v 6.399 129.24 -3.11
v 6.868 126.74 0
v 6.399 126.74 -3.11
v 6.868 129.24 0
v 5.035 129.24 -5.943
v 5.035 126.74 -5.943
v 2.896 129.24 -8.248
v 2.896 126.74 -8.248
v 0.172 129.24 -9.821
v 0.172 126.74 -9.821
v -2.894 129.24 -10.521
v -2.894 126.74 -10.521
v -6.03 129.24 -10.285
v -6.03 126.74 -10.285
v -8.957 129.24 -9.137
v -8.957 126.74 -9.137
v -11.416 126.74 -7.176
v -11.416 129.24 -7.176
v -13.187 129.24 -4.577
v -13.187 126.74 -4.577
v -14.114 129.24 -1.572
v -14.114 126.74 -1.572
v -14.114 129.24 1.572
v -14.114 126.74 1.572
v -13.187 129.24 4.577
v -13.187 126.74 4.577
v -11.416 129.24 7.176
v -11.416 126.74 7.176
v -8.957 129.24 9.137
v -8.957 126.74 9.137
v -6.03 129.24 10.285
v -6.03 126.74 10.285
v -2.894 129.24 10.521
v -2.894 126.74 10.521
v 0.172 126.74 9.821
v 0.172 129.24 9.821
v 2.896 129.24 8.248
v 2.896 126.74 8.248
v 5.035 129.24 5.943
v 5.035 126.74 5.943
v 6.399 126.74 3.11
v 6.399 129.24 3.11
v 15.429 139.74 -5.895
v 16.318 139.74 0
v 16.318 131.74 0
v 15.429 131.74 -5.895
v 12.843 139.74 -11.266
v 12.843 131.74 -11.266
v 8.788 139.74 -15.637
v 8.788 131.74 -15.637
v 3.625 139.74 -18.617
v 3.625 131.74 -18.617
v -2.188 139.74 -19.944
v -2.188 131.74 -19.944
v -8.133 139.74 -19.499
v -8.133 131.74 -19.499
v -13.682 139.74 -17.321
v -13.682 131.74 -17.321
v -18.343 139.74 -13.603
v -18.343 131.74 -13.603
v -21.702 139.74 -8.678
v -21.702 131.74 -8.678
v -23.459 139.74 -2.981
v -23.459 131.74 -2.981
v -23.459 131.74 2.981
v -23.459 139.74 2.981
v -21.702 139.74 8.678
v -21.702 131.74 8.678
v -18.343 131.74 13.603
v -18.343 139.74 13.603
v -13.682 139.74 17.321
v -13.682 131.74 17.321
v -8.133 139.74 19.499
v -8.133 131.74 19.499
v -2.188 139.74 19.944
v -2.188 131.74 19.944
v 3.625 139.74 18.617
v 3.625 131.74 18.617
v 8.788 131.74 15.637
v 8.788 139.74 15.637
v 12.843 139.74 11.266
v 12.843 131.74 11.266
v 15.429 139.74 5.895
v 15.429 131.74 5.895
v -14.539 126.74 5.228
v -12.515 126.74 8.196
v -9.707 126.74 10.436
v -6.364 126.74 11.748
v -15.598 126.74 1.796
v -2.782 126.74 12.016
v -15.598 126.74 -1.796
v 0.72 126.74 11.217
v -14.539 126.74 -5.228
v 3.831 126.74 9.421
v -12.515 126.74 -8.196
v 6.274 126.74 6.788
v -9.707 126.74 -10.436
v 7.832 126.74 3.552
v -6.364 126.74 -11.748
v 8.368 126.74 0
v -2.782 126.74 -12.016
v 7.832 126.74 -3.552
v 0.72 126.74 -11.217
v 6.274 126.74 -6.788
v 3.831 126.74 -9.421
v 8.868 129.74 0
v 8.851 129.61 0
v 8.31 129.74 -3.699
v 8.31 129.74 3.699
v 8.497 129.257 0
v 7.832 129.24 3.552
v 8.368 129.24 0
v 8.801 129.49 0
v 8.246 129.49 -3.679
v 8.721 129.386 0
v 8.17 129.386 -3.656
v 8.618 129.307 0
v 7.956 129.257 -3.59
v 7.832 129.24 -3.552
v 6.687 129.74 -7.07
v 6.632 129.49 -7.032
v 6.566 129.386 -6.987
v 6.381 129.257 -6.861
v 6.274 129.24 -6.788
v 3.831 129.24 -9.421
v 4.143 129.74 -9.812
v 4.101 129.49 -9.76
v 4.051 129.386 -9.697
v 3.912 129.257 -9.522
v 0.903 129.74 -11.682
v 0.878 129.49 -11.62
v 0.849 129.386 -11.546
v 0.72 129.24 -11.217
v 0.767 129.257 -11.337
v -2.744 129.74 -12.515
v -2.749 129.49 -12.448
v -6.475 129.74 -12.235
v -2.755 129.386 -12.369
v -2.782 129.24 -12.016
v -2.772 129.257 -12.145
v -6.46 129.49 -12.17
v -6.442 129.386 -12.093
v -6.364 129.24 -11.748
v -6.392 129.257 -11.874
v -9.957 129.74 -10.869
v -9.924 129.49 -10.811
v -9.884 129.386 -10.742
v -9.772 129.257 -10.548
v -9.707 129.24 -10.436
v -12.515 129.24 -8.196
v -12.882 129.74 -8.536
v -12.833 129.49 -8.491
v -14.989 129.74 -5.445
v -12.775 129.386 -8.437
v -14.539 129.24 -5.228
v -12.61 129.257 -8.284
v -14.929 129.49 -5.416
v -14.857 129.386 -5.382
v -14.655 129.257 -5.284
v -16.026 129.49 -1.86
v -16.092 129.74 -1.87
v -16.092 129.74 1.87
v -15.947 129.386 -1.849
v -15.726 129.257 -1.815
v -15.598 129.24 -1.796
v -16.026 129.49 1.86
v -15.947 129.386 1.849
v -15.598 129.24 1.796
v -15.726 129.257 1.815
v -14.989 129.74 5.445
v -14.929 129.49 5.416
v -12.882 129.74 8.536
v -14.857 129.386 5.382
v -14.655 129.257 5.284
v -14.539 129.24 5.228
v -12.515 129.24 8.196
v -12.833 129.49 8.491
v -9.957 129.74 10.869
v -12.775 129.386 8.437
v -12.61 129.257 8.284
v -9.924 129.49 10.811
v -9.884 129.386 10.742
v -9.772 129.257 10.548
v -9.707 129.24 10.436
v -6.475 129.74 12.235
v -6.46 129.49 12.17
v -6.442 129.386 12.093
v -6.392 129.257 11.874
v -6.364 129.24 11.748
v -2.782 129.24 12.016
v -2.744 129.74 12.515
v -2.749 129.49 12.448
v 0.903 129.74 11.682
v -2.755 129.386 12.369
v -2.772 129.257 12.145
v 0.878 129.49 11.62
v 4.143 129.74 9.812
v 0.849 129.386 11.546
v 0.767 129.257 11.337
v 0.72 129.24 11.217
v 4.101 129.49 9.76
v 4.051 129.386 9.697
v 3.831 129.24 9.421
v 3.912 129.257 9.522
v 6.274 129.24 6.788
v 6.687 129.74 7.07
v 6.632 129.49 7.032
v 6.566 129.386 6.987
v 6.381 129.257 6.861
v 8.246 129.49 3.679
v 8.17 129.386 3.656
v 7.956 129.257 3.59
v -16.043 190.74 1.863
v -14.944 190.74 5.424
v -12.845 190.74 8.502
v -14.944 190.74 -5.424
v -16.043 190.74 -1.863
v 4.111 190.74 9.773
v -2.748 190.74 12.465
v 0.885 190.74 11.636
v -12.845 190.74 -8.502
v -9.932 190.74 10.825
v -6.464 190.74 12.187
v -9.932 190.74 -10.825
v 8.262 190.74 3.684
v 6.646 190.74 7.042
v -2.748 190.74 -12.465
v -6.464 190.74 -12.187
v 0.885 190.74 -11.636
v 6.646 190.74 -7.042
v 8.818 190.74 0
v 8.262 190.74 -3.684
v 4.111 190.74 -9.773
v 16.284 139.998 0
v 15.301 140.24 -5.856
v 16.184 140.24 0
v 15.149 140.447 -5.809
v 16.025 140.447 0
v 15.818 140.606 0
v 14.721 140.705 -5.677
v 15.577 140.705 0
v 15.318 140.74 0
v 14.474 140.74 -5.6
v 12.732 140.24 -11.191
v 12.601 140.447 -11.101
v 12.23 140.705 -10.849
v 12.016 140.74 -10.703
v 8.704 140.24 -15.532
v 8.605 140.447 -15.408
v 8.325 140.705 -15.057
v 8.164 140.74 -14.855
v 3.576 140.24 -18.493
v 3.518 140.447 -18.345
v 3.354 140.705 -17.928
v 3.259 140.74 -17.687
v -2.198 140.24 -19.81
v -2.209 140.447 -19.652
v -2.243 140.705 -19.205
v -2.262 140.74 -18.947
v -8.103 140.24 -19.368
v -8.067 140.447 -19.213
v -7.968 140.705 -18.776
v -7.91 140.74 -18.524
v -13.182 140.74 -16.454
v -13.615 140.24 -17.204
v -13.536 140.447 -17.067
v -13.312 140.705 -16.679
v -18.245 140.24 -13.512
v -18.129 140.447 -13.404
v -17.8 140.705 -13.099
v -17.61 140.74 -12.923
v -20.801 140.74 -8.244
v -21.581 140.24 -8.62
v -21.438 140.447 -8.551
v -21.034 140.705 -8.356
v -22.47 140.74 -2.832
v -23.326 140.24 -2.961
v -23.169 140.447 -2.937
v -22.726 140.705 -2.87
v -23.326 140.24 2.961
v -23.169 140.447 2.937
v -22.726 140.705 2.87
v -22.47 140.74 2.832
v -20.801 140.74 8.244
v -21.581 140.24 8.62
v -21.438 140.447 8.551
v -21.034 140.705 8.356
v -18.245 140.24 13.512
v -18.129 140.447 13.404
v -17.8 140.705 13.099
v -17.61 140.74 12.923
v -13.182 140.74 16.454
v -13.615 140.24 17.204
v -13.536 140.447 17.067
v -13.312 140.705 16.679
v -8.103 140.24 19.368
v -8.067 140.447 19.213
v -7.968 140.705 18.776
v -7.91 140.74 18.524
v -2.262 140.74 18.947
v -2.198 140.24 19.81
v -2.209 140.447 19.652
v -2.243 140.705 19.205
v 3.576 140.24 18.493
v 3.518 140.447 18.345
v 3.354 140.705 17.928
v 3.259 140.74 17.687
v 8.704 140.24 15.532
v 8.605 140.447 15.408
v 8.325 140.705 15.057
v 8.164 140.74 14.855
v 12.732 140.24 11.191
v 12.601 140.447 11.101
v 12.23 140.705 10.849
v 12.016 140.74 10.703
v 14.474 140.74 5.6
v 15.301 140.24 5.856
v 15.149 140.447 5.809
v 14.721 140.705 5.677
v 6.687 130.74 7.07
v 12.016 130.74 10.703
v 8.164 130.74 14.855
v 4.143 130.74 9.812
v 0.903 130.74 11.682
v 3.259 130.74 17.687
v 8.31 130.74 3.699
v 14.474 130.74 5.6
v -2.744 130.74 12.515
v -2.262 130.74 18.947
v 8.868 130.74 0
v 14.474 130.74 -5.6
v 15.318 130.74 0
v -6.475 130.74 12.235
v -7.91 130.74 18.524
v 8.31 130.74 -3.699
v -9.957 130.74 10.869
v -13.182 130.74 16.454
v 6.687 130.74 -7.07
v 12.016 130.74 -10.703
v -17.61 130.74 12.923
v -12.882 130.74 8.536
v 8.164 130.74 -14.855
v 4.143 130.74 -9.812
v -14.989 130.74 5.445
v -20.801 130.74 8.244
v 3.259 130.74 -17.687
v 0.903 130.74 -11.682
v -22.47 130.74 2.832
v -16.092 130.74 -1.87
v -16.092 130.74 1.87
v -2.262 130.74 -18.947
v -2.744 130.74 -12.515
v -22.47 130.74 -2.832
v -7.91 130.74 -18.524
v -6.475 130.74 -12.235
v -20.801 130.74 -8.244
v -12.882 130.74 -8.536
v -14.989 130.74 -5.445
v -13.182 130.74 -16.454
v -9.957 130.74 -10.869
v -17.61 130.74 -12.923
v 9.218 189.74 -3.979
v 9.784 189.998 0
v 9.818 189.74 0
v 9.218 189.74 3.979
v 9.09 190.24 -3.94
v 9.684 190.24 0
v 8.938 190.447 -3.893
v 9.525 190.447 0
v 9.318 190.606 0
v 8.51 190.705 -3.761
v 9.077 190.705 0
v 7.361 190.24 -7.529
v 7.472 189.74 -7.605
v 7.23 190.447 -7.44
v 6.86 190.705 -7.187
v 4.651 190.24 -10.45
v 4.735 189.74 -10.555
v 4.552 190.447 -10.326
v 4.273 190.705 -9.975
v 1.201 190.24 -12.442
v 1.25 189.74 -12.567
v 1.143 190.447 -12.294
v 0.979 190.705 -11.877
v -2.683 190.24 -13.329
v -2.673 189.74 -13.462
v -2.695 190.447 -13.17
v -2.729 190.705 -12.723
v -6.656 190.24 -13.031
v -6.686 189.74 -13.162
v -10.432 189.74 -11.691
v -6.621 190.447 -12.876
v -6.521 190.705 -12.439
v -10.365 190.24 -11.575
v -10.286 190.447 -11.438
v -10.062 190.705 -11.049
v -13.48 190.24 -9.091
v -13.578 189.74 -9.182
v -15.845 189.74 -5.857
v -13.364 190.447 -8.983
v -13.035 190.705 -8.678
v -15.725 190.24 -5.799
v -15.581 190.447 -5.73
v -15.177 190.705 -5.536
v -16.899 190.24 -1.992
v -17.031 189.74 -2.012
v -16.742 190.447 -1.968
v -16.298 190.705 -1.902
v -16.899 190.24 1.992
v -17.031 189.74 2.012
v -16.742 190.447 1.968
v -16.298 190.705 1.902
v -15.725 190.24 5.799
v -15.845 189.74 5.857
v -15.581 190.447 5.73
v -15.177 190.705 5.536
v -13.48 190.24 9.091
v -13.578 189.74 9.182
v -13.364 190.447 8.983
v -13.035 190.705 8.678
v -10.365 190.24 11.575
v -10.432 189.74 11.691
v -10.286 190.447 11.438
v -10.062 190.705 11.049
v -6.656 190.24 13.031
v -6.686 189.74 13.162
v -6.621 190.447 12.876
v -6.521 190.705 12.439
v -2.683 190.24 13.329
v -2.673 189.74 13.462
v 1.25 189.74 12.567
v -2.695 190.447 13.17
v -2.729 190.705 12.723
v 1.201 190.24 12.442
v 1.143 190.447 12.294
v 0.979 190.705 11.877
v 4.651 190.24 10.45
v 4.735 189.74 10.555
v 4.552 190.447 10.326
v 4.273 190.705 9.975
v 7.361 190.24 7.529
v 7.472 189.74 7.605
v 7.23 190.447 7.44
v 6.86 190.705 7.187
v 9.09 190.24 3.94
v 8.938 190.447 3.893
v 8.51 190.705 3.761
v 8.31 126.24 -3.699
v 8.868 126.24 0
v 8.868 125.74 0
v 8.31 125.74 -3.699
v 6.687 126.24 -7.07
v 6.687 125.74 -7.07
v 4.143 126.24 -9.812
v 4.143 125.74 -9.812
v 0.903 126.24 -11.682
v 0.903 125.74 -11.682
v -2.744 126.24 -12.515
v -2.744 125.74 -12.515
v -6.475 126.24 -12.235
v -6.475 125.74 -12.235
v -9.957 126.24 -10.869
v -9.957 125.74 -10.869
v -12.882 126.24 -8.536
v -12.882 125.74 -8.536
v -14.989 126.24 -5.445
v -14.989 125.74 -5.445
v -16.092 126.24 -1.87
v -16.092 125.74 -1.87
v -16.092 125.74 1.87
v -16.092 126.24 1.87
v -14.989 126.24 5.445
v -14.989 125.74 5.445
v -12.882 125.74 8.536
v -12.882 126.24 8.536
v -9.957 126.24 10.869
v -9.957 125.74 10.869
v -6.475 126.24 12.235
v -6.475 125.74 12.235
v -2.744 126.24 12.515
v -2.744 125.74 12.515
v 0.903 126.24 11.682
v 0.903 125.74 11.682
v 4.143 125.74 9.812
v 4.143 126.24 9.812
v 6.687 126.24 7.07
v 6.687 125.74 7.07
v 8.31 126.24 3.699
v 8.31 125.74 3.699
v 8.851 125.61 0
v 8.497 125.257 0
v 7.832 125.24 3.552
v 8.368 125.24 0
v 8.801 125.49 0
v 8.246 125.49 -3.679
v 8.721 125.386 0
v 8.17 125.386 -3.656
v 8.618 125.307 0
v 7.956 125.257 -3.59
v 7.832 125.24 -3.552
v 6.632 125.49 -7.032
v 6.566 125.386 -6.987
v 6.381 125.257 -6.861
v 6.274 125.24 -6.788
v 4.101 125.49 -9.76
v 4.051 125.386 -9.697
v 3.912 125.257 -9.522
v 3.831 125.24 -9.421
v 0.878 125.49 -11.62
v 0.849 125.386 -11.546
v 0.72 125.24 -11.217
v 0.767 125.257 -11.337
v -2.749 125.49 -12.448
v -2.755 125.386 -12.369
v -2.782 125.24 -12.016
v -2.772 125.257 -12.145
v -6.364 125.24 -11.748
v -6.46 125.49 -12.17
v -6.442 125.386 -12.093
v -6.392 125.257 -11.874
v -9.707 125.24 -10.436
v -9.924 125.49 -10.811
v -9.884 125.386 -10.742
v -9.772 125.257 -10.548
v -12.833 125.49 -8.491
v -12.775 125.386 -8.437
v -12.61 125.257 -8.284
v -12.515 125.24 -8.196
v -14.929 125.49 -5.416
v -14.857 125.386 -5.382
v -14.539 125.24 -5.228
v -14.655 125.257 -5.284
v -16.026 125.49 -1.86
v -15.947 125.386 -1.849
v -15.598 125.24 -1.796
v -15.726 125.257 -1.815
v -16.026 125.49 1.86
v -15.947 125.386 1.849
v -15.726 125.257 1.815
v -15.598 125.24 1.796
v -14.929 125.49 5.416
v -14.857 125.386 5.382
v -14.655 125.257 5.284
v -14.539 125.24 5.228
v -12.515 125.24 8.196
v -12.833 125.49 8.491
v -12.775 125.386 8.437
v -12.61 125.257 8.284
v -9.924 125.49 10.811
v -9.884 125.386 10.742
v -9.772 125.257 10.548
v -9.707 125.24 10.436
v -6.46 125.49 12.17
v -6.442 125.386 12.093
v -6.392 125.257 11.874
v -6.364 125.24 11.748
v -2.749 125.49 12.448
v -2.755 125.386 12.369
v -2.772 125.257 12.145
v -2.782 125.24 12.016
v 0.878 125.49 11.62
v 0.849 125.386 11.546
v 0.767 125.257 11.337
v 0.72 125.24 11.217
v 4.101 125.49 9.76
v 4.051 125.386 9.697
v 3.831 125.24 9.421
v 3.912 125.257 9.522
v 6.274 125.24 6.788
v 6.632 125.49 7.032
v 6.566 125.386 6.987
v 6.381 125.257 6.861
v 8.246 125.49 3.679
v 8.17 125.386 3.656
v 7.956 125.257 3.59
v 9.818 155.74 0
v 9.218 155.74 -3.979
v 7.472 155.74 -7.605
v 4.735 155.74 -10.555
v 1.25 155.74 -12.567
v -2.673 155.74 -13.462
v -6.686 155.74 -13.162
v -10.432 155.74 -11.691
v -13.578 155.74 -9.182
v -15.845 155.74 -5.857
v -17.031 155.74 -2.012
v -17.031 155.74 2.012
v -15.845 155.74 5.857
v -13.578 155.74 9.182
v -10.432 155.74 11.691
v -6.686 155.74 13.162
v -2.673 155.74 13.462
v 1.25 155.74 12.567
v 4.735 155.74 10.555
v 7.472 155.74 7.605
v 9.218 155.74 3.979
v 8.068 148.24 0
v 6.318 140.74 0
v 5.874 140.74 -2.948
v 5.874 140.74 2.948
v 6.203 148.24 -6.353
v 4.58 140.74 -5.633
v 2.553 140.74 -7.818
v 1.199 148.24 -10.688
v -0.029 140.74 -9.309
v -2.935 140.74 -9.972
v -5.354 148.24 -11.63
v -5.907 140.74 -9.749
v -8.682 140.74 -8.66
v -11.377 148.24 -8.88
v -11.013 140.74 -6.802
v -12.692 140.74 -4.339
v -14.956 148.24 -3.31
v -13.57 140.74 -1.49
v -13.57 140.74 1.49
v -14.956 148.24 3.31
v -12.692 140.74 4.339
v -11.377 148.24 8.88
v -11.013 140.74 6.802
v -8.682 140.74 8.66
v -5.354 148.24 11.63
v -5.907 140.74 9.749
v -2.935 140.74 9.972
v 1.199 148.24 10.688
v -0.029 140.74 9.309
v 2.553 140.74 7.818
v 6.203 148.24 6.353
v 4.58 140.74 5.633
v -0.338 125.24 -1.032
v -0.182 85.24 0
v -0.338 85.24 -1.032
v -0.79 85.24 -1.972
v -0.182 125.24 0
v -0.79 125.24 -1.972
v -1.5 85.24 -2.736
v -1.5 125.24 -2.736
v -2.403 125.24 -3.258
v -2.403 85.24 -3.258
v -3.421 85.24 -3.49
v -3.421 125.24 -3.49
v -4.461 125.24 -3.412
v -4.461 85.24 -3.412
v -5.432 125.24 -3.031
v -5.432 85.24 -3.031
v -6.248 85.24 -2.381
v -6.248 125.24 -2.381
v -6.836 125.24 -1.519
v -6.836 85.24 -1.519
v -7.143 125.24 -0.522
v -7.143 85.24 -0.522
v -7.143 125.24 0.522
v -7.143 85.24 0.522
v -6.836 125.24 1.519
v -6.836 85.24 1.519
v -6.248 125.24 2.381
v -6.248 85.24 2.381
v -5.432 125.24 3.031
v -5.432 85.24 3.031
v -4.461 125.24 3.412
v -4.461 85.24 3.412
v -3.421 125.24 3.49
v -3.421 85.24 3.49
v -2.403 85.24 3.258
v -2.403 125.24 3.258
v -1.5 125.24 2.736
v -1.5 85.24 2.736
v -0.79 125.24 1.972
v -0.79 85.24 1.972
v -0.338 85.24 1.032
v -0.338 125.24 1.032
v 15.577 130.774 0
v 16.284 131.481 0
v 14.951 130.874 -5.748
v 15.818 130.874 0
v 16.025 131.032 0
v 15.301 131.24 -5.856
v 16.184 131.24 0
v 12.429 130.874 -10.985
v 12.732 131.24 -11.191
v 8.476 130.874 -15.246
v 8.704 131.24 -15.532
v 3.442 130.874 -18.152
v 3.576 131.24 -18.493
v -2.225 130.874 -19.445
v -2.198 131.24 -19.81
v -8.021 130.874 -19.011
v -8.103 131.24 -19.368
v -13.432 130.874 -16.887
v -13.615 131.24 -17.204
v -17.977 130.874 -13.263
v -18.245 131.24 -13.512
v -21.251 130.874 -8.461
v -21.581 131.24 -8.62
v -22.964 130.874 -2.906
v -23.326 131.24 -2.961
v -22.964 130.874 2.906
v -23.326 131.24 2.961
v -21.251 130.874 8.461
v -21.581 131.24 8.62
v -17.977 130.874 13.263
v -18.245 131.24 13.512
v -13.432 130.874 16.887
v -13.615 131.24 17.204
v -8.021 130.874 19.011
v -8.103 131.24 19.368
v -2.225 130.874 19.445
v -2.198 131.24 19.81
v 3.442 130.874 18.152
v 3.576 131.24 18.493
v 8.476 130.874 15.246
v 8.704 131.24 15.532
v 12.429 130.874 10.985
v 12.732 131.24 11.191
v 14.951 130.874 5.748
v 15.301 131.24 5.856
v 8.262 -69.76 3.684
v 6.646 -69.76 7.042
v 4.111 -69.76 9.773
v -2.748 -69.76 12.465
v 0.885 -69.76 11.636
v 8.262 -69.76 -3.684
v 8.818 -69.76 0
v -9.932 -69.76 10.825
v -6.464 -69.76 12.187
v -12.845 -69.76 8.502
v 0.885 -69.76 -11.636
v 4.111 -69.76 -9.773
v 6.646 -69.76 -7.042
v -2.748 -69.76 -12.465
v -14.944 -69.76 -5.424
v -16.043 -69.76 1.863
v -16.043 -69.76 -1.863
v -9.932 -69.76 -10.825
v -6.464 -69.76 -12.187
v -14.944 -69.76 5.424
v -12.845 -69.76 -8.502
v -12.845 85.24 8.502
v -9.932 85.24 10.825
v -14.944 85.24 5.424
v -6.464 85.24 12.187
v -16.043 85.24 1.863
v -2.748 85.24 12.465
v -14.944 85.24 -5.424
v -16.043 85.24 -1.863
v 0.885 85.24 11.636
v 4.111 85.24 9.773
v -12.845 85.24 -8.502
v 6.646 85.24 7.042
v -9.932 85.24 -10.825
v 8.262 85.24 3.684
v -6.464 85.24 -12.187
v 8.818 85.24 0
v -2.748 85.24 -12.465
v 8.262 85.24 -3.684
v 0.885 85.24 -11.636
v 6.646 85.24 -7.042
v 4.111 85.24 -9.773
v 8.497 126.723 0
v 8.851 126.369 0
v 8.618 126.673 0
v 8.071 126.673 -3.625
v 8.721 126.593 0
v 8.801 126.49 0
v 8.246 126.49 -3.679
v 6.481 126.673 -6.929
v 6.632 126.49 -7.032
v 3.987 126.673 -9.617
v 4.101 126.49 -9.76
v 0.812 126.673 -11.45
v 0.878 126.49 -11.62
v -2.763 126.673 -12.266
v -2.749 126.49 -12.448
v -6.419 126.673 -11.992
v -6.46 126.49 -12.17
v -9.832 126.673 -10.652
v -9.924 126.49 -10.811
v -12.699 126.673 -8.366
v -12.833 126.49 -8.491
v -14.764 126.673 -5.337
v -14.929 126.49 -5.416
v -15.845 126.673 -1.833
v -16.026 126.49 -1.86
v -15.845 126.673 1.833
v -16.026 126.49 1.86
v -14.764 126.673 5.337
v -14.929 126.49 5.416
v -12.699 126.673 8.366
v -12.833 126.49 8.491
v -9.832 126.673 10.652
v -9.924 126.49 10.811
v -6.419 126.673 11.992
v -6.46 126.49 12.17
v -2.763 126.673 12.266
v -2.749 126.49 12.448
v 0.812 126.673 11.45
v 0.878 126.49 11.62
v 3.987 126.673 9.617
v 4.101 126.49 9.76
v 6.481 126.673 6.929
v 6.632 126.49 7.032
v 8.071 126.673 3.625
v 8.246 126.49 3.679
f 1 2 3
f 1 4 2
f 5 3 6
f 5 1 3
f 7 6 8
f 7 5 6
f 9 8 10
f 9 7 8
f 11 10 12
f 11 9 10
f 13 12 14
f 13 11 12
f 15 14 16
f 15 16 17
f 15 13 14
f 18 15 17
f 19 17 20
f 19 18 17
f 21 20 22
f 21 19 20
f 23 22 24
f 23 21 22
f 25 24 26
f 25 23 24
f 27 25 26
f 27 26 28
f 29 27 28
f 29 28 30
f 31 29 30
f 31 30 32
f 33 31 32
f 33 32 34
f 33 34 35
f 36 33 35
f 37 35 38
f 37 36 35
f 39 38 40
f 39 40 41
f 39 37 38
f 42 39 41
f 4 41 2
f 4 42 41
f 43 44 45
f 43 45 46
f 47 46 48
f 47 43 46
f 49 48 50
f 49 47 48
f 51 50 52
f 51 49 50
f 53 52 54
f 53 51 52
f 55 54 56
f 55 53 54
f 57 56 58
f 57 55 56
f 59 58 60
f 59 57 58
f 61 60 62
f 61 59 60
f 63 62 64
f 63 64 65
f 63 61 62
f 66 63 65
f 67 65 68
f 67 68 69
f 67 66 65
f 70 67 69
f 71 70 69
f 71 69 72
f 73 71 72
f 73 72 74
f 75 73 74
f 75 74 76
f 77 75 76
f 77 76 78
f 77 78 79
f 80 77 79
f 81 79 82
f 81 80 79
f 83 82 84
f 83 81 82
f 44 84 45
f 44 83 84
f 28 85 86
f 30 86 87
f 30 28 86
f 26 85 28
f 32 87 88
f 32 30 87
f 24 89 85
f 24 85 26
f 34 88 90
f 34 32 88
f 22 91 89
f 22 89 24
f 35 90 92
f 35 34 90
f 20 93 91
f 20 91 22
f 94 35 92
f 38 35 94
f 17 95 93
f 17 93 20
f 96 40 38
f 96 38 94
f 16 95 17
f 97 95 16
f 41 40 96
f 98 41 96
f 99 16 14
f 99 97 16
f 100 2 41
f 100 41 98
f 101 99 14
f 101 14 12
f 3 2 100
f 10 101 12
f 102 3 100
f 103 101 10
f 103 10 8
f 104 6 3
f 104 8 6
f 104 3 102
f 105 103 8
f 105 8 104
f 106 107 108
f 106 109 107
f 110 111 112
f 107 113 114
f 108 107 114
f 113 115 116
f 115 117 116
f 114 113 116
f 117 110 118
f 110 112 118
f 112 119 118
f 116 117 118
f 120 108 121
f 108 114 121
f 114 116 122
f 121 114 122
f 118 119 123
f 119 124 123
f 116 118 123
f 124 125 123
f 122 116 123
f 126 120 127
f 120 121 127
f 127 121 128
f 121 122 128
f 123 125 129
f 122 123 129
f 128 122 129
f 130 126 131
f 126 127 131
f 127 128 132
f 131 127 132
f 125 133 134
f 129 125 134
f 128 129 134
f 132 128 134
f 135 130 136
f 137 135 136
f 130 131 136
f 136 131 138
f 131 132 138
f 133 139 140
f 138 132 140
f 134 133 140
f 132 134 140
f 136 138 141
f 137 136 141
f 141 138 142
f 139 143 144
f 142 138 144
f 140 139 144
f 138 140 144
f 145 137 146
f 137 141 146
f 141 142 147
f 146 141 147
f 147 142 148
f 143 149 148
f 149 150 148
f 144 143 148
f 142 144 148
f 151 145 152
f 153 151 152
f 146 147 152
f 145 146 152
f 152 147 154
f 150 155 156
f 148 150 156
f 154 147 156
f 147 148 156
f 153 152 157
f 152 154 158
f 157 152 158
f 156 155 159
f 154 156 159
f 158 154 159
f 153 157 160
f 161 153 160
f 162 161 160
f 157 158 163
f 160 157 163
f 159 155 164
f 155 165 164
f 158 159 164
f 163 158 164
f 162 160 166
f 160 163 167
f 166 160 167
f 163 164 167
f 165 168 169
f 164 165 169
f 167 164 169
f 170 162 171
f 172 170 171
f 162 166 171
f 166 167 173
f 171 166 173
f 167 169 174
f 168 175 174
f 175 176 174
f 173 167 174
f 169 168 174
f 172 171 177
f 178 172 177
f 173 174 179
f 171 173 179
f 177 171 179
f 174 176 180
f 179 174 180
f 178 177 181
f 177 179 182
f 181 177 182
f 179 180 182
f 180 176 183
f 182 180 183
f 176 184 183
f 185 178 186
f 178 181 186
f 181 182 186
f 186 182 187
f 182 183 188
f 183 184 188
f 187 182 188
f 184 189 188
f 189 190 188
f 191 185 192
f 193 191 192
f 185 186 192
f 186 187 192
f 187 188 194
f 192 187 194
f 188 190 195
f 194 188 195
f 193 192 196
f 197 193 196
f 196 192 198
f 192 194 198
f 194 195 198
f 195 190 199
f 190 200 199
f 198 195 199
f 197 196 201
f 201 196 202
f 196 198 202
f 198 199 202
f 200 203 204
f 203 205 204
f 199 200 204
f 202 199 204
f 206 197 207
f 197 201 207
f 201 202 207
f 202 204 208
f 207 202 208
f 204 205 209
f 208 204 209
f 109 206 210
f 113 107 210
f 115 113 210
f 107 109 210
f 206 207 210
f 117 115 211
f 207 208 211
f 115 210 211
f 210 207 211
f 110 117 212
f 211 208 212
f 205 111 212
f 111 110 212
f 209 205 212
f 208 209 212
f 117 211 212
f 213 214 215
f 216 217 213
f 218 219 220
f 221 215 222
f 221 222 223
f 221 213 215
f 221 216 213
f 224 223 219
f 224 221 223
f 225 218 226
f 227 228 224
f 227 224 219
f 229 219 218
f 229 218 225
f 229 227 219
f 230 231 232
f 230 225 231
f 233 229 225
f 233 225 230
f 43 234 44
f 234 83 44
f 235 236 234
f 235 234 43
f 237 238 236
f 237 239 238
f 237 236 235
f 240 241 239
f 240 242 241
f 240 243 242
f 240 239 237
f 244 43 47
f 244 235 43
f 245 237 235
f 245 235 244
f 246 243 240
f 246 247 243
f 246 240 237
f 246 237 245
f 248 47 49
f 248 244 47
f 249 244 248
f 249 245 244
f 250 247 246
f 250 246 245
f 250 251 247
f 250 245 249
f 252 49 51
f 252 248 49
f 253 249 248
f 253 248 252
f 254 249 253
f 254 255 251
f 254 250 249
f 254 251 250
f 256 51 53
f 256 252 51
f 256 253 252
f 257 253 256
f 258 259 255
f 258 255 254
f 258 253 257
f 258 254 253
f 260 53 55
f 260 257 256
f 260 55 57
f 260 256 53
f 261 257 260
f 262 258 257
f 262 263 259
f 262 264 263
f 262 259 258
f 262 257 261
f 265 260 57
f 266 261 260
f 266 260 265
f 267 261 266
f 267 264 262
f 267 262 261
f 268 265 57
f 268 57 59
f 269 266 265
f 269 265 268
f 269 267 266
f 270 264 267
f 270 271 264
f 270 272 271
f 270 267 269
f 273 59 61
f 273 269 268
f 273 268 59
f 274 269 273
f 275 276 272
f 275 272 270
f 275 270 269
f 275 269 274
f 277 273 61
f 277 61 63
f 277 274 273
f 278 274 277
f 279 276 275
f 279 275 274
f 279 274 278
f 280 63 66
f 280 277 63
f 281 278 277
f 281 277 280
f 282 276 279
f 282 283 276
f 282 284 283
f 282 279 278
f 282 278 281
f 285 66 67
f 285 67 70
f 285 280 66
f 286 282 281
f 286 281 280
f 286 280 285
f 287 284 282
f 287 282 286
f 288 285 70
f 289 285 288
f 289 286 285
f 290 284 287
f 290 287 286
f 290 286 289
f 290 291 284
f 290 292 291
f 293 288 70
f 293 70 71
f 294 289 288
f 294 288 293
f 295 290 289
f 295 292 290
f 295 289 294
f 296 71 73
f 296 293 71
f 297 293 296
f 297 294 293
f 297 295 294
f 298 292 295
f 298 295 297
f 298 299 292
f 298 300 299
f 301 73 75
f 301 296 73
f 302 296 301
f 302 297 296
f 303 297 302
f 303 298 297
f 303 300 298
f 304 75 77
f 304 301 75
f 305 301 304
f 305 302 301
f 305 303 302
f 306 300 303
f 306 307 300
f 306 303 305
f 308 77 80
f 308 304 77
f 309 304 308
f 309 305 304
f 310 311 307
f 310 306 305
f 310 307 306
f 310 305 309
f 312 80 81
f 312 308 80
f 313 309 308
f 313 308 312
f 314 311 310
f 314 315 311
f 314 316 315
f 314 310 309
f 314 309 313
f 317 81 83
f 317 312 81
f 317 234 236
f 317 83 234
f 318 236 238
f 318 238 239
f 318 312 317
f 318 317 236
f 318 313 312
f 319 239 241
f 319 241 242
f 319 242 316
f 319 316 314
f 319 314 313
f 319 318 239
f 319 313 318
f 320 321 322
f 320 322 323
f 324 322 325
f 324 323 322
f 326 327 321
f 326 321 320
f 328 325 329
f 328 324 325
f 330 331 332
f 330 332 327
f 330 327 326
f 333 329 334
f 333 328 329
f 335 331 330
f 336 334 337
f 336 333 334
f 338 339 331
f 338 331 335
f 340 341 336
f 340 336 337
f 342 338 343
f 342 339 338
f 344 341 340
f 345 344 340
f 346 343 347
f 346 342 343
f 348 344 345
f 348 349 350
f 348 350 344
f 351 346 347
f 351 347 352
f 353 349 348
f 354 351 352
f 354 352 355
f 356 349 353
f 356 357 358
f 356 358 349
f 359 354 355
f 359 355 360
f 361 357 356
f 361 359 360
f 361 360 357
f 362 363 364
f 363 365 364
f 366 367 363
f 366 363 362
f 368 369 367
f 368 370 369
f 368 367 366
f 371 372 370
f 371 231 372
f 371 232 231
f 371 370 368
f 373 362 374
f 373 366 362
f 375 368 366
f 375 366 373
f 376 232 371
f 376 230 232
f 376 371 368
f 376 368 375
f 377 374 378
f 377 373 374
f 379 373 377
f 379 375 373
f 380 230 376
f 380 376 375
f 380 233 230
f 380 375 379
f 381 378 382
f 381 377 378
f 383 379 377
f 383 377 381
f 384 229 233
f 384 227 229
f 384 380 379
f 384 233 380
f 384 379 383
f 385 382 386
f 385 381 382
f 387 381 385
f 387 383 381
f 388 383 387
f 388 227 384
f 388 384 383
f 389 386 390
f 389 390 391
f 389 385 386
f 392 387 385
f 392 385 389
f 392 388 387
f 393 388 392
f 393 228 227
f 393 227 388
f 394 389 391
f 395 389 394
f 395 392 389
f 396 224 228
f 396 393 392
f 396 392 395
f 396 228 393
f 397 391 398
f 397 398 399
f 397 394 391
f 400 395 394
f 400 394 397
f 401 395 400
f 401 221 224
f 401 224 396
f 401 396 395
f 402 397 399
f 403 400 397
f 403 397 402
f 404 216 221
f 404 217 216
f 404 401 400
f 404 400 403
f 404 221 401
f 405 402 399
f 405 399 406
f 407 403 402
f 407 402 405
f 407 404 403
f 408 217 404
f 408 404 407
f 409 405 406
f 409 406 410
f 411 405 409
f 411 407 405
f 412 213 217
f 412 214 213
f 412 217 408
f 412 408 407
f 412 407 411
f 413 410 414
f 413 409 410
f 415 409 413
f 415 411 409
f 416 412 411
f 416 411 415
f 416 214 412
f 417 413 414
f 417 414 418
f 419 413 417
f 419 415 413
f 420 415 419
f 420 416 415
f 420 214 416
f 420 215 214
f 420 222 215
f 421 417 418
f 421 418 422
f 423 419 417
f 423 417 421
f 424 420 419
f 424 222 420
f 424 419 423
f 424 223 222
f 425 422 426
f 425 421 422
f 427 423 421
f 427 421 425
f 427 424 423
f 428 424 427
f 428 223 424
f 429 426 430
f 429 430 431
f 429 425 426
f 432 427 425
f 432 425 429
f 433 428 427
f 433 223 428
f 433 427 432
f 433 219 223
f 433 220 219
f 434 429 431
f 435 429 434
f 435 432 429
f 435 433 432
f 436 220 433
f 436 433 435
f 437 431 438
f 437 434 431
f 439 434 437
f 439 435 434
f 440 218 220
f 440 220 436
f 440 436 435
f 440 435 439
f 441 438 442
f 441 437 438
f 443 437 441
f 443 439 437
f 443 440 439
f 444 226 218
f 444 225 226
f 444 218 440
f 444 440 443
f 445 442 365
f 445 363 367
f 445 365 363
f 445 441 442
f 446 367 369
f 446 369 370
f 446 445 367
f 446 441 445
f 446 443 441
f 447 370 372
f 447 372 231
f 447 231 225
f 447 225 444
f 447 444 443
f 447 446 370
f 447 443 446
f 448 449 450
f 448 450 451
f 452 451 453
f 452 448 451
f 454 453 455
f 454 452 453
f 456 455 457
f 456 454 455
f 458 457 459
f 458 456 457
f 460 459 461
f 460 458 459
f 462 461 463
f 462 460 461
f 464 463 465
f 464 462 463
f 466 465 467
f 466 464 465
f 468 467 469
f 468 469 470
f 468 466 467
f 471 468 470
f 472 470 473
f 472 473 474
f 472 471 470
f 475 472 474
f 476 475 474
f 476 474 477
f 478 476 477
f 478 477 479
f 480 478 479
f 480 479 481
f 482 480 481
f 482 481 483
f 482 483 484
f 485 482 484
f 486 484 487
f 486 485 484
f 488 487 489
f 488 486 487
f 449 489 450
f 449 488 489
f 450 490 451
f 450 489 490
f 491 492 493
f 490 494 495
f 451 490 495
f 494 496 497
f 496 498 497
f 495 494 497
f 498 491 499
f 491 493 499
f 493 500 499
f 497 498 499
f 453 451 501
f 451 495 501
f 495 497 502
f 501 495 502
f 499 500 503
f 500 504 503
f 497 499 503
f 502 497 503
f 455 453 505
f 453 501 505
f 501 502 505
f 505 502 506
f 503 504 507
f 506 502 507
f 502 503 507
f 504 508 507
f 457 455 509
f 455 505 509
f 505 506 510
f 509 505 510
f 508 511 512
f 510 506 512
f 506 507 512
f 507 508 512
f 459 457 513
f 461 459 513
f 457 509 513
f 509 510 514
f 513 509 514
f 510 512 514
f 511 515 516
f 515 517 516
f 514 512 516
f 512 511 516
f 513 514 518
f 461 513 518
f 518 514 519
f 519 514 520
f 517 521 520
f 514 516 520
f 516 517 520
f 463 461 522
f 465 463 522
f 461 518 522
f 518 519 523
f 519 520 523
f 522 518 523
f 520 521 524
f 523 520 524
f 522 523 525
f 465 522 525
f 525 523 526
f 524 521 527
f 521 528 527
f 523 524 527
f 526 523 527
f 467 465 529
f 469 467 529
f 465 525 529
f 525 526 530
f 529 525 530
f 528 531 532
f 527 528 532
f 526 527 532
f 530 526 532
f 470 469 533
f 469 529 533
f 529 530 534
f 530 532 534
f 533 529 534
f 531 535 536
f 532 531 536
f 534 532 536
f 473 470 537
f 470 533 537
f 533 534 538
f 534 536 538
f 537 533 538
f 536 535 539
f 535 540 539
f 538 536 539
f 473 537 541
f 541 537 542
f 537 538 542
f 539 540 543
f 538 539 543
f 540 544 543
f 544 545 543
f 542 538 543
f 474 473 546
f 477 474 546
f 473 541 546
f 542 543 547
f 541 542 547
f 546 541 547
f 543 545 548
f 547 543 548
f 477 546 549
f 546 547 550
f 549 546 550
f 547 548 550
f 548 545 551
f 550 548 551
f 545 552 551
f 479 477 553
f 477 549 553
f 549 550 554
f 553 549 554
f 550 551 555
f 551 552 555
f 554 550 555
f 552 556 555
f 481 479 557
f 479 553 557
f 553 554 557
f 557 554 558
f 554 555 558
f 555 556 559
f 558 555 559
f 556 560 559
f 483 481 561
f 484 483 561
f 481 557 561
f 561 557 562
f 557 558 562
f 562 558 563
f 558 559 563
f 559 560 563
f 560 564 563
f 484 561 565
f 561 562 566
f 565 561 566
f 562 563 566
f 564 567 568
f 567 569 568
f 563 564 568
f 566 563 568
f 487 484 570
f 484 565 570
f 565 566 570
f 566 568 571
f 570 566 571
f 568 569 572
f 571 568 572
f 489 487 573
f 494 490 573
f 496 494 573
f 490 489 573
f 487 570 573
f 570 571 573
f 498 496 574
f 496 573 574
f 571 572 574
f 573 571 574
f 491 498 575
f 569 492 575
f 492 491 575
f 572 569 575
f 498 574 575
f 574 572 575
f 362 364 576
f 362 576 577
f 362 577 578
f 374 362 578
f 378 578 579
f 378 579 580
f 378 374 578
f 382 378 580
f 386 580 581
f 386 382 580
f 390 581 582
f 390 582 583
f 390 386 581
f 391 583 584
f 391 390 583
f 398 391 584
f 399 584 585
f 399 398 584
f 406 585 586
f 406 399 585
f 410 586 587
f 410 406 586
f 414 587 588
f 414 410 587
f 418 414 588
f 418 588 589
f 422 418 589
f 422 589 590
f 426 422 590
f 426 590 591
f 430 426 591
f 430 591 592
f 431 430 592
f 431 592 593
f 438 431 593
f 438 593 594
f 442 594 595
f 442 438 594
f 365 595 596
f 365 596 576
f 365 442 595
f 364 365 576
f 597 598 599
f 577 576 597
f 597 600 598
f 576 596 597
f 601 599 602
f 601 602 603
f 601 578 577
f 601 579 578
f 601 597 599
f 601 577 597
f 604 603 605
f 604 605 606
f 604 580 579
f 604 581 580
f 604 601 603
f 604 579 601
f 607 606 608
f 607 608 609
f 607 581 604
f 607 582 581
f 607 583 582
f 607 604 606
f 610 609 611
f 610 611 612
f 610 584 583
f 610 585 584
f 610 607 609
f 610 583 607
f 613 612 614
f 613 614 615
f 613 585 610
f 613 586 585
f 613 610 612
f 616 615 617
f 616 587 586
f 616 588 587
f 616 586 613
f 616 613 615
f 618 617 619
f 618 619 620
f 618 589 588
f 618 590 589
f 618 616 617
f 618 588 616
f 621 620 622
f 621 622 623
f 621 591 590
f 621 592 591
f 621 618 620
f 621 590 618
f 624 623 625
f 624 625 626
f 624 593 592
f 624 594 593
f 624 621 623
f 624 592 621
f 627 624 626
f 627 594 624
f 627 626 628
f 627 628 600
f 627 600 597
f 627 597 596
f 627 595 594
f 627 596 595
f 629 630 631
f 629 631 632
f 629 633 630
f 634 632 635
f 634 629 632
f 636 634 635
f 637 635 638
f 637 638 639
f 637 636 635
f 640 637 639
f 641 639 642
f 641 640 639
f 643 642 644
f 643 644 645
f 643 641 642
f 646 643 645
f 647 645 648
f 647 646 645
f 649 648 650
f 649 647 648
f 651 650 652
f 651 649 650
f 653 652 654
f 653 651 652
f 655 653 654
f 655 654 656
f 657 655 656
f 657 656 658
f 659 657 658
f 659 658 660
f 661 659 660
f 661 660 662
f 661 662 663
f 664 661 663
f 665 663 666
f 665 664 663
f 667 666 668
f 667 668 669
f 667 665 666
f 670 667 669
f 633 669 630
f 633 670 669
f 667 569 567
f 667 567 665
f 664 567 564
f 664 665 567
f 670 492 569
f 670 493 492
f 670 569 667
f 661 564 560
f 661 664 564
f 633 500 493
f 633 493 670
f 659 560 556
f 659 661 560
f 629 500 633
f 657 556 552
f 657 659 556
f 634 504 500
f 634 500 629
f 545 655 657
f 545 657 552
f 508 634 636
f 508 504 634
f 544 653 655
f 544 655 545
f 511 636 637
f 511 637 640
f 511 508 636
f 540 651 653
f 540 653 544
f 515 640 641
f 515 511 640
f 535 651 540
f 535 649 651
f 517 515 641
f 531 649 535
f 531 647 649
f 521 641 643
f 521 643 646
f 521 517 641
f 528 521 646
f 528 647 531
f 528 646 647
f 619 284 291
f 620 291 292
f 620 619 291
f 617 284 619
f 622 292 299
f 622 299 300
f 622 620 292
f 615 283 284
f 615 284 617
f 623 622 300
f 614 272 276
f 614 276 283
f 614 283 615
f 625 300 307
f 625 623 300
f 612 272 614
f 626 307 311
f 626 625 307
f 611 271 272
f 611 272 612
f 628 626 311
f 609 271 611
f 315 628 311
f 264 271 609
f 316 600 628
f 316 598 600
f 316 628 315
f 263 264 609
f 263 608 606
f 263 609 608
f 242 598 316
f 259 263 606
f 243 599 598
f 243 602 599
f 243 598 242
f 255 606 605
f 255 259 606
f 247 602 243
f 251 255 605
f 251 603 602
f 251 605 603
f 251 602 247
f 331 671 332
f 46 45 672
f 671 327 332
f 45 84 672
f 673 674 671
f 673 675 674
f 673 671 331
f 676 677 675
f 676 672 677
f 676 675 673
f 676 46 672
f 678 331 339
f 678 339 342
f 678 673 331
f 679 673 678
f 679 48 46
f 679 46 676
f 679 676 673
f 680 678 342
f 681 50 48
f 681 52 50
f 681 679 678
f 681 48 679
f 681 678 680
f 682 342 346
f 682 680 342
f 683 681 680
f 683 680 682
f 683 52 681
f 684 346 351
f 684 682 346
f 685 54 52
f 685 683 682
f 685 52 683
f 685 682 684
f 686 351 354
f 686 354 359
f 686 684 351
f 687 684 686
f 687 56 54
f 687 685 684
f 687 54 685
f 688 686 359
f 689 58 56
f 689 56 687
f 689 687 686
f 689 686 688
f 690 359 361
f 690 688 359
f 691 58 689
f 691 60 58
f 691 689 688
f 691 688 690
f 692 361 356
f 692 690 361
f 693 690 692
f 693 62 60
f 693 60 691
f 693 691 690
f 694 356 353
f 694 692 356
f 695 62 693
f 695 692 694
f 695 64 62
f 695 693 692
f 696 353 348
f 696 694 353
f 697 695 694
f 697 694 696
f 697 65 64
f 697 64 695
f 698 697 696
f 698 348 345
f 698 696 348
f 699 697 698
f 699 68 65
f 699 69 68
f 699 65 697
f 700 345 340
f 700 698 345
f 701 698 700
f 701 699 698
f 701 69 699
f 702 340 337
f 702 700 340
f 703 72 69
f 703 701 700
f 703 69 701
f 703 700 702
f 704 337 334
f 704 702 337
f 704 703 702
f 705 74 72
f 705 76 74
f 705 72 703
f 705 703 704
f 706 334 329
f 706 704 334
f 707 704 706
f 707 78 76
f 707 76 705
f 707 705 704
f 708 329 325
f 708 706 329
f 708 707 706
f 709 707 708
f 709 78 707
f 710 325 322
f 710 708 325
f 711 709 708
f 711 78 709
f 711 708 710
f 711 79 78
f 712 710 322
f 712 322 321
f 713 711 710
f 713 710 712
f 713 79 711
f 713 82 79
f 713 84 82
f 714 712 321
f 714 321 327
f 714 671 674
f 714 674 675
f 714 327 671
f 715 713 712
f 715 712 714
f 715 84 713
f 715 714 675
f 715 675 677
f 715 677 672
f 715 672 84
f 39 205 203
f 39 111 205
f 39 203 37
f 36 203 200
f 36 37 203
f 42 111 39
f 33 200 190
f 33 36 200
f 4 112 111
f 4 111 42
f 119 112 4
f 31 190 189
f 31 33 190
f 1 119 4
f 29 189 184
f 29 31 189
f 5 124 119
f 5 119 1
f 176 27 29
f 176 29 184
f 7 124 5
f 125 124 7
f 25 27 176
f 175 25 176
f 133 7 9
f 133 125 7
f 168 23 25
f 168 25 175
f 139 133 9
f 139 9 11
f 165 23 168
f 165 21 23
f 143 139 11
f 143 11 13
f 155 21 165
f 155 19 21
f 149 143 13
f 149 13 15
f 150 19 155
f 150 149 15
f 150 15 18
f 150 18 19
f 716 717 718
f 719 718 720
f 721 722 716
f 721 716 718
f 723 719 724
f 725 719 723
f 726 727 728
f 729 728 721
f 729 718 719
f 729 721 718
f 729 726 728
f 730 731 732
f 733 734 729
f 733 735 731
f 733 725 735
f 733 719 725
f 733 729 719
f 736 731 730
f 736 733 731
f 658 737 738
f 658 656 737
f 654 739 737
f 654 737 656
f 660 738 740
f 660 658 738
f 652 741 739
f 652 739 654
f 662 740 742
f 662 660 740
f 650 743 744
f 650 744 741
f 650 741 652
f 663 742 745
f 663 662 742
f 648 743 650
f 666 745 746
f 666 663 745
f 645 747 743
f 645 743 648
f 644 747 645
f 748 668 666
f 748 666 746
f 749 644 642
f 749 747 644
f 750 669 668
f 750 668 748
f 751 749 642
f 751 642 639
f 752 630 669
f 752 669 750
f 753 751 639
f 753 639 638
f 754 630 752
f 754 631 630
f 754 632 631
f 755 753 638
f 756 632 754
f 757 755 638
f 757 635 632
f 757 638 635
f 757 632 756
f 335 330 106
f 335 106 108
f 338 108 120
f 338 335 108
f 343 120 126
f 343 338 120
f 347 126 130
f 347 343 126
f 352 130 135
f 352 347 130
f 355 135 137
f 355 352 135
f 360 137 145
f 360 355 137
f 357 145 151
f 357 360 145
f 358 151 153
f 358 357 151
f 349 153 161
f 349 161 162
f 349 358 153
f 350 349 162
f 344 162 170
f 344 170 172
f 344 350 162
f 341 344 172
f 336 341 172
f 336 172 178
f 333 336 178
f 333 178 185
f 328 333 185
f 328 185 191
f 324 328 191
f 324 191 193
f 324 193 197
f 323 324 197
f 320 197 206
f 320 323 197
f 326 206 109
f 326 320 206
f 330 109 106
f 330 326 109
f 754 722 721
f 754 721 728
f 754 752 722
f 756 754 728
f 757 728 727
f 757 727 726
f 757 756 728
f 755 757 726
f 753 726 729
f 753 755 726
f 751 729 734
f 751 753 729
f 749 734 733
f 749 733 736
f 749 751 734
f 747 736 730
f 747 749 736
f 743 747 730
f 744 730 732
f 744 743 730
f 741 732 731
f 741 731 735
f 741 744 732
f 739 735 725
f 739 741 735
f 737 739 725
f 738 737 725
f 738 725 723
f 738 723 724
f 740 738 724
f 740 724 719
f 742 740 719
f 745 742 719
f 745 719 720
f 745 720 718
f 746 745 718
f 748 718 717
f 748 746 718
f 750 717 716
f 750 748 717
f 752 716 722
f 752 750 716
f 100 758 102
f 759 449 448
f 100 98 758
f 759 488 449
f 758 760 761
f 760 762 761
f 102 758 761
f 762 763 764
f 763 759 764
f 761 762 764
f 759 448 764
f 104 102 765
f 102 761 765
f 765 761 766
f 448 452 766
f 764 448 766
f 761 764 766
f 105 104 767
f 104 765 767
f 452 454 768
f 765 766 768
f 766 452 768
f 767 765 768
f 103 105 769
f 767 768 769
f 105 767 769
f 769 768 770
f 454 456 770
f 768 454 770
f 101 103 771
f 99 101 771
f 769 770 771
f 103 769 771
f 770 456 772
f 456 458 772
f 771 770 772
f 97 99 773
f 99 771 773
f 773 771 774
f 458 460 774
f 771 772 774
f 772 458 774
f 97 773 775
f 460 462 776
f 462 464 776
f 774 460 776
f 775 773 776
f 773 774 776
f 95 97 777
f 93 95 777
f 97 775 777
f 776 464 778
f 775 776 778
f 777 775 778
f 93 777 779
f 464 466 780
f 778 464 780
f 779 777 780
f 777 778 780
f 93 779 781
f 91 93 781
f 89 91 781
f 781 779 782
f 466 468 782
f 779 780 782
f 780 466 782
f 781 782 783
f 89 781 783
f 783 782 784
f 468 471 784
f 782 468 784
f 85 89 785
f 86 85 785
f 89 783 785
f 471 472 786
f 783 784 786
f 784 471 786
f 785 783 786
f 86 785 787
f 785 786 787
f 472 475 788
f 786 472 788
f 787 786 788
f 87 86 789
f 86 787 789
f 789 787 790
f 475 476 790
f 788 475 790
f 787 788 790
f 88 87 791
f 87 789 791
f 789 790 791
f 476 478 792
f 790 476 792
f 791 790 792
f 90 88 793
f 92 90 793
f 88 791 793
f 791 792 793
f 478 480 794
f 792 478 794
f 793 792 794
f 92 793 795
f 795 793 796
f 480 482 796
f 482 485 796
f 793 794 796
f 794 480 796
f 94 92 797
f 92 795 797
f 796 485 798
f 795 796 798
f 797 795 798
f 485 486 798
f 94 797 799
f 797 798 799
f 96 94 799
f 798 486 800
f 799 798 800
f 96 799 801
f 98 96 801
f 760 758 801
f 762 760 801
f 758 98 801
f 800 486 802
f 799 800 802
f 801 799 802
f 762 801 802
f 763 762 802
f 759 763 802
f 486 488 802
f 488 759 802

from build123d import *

# Parameters (mm, degrees)
F2_R = 1
F3_R = 0.5


with BuildPart() as f1:
    # F0 (on Top) → F1 (revolve)
    with BuildSketch(Plane.XY):
        Polygon((-3.6821774035, 190.7395421601), (-3.6821774035, -69.7604578399), (8.8178225965, -69.7604578399), (8.8178225965, 85.2395421601), (-0.1821774035, 85.2395421601), (-0.1821774035, 125.2395421601), (-0.1821774035, 130.7395421601), (8.8678225965, 130.7395421601), (16.3178225965, 130.7395421601), (16.3178225965, 140.7395421601), (6.3178225965, 140.7395421601), (9.8178225965, 155.7395421601), (9.8178225965, 190.7395421601), align=None)
        Polygon((-0.1821774035, 130.7395421601), (-0.1821774035, 125.2395421601), (8.8678225965, 125.2395421601), (8.8678225965, 126.7395421601), (6.8678225965, 126.7395421601), (6.8678225965, 129.2395421601), (8.8678225965, 129.2395421601), (8.8678225965, 130.7395421601), align=None)
    revolve(axis=Axis((-3.6821774035, 60.4895421601, 0), (0, 1, 0)))

    # F2
    f2_edges = [f1.edges().sort_by_distance(p)[0] for p in [
        (-17.182177, 190.739542, 0),
        (-23.682177, 140.739542, 0),
        (-23.682177, 130.739542, 0),
    ]]
    fillet(f2_edges, radius=F2_R)

    # F3
    f3_edges = [f1.edges().sort_by_distance(p)[0] for p in [
        (-16.232177, 125.239542, 0),
        (-16.232177, 126.739542, 0),
        (-16.232177, 129.239542, 0),
    ]]
    fillet(f3_edges, radius=F3_R)


solid = f1.part
